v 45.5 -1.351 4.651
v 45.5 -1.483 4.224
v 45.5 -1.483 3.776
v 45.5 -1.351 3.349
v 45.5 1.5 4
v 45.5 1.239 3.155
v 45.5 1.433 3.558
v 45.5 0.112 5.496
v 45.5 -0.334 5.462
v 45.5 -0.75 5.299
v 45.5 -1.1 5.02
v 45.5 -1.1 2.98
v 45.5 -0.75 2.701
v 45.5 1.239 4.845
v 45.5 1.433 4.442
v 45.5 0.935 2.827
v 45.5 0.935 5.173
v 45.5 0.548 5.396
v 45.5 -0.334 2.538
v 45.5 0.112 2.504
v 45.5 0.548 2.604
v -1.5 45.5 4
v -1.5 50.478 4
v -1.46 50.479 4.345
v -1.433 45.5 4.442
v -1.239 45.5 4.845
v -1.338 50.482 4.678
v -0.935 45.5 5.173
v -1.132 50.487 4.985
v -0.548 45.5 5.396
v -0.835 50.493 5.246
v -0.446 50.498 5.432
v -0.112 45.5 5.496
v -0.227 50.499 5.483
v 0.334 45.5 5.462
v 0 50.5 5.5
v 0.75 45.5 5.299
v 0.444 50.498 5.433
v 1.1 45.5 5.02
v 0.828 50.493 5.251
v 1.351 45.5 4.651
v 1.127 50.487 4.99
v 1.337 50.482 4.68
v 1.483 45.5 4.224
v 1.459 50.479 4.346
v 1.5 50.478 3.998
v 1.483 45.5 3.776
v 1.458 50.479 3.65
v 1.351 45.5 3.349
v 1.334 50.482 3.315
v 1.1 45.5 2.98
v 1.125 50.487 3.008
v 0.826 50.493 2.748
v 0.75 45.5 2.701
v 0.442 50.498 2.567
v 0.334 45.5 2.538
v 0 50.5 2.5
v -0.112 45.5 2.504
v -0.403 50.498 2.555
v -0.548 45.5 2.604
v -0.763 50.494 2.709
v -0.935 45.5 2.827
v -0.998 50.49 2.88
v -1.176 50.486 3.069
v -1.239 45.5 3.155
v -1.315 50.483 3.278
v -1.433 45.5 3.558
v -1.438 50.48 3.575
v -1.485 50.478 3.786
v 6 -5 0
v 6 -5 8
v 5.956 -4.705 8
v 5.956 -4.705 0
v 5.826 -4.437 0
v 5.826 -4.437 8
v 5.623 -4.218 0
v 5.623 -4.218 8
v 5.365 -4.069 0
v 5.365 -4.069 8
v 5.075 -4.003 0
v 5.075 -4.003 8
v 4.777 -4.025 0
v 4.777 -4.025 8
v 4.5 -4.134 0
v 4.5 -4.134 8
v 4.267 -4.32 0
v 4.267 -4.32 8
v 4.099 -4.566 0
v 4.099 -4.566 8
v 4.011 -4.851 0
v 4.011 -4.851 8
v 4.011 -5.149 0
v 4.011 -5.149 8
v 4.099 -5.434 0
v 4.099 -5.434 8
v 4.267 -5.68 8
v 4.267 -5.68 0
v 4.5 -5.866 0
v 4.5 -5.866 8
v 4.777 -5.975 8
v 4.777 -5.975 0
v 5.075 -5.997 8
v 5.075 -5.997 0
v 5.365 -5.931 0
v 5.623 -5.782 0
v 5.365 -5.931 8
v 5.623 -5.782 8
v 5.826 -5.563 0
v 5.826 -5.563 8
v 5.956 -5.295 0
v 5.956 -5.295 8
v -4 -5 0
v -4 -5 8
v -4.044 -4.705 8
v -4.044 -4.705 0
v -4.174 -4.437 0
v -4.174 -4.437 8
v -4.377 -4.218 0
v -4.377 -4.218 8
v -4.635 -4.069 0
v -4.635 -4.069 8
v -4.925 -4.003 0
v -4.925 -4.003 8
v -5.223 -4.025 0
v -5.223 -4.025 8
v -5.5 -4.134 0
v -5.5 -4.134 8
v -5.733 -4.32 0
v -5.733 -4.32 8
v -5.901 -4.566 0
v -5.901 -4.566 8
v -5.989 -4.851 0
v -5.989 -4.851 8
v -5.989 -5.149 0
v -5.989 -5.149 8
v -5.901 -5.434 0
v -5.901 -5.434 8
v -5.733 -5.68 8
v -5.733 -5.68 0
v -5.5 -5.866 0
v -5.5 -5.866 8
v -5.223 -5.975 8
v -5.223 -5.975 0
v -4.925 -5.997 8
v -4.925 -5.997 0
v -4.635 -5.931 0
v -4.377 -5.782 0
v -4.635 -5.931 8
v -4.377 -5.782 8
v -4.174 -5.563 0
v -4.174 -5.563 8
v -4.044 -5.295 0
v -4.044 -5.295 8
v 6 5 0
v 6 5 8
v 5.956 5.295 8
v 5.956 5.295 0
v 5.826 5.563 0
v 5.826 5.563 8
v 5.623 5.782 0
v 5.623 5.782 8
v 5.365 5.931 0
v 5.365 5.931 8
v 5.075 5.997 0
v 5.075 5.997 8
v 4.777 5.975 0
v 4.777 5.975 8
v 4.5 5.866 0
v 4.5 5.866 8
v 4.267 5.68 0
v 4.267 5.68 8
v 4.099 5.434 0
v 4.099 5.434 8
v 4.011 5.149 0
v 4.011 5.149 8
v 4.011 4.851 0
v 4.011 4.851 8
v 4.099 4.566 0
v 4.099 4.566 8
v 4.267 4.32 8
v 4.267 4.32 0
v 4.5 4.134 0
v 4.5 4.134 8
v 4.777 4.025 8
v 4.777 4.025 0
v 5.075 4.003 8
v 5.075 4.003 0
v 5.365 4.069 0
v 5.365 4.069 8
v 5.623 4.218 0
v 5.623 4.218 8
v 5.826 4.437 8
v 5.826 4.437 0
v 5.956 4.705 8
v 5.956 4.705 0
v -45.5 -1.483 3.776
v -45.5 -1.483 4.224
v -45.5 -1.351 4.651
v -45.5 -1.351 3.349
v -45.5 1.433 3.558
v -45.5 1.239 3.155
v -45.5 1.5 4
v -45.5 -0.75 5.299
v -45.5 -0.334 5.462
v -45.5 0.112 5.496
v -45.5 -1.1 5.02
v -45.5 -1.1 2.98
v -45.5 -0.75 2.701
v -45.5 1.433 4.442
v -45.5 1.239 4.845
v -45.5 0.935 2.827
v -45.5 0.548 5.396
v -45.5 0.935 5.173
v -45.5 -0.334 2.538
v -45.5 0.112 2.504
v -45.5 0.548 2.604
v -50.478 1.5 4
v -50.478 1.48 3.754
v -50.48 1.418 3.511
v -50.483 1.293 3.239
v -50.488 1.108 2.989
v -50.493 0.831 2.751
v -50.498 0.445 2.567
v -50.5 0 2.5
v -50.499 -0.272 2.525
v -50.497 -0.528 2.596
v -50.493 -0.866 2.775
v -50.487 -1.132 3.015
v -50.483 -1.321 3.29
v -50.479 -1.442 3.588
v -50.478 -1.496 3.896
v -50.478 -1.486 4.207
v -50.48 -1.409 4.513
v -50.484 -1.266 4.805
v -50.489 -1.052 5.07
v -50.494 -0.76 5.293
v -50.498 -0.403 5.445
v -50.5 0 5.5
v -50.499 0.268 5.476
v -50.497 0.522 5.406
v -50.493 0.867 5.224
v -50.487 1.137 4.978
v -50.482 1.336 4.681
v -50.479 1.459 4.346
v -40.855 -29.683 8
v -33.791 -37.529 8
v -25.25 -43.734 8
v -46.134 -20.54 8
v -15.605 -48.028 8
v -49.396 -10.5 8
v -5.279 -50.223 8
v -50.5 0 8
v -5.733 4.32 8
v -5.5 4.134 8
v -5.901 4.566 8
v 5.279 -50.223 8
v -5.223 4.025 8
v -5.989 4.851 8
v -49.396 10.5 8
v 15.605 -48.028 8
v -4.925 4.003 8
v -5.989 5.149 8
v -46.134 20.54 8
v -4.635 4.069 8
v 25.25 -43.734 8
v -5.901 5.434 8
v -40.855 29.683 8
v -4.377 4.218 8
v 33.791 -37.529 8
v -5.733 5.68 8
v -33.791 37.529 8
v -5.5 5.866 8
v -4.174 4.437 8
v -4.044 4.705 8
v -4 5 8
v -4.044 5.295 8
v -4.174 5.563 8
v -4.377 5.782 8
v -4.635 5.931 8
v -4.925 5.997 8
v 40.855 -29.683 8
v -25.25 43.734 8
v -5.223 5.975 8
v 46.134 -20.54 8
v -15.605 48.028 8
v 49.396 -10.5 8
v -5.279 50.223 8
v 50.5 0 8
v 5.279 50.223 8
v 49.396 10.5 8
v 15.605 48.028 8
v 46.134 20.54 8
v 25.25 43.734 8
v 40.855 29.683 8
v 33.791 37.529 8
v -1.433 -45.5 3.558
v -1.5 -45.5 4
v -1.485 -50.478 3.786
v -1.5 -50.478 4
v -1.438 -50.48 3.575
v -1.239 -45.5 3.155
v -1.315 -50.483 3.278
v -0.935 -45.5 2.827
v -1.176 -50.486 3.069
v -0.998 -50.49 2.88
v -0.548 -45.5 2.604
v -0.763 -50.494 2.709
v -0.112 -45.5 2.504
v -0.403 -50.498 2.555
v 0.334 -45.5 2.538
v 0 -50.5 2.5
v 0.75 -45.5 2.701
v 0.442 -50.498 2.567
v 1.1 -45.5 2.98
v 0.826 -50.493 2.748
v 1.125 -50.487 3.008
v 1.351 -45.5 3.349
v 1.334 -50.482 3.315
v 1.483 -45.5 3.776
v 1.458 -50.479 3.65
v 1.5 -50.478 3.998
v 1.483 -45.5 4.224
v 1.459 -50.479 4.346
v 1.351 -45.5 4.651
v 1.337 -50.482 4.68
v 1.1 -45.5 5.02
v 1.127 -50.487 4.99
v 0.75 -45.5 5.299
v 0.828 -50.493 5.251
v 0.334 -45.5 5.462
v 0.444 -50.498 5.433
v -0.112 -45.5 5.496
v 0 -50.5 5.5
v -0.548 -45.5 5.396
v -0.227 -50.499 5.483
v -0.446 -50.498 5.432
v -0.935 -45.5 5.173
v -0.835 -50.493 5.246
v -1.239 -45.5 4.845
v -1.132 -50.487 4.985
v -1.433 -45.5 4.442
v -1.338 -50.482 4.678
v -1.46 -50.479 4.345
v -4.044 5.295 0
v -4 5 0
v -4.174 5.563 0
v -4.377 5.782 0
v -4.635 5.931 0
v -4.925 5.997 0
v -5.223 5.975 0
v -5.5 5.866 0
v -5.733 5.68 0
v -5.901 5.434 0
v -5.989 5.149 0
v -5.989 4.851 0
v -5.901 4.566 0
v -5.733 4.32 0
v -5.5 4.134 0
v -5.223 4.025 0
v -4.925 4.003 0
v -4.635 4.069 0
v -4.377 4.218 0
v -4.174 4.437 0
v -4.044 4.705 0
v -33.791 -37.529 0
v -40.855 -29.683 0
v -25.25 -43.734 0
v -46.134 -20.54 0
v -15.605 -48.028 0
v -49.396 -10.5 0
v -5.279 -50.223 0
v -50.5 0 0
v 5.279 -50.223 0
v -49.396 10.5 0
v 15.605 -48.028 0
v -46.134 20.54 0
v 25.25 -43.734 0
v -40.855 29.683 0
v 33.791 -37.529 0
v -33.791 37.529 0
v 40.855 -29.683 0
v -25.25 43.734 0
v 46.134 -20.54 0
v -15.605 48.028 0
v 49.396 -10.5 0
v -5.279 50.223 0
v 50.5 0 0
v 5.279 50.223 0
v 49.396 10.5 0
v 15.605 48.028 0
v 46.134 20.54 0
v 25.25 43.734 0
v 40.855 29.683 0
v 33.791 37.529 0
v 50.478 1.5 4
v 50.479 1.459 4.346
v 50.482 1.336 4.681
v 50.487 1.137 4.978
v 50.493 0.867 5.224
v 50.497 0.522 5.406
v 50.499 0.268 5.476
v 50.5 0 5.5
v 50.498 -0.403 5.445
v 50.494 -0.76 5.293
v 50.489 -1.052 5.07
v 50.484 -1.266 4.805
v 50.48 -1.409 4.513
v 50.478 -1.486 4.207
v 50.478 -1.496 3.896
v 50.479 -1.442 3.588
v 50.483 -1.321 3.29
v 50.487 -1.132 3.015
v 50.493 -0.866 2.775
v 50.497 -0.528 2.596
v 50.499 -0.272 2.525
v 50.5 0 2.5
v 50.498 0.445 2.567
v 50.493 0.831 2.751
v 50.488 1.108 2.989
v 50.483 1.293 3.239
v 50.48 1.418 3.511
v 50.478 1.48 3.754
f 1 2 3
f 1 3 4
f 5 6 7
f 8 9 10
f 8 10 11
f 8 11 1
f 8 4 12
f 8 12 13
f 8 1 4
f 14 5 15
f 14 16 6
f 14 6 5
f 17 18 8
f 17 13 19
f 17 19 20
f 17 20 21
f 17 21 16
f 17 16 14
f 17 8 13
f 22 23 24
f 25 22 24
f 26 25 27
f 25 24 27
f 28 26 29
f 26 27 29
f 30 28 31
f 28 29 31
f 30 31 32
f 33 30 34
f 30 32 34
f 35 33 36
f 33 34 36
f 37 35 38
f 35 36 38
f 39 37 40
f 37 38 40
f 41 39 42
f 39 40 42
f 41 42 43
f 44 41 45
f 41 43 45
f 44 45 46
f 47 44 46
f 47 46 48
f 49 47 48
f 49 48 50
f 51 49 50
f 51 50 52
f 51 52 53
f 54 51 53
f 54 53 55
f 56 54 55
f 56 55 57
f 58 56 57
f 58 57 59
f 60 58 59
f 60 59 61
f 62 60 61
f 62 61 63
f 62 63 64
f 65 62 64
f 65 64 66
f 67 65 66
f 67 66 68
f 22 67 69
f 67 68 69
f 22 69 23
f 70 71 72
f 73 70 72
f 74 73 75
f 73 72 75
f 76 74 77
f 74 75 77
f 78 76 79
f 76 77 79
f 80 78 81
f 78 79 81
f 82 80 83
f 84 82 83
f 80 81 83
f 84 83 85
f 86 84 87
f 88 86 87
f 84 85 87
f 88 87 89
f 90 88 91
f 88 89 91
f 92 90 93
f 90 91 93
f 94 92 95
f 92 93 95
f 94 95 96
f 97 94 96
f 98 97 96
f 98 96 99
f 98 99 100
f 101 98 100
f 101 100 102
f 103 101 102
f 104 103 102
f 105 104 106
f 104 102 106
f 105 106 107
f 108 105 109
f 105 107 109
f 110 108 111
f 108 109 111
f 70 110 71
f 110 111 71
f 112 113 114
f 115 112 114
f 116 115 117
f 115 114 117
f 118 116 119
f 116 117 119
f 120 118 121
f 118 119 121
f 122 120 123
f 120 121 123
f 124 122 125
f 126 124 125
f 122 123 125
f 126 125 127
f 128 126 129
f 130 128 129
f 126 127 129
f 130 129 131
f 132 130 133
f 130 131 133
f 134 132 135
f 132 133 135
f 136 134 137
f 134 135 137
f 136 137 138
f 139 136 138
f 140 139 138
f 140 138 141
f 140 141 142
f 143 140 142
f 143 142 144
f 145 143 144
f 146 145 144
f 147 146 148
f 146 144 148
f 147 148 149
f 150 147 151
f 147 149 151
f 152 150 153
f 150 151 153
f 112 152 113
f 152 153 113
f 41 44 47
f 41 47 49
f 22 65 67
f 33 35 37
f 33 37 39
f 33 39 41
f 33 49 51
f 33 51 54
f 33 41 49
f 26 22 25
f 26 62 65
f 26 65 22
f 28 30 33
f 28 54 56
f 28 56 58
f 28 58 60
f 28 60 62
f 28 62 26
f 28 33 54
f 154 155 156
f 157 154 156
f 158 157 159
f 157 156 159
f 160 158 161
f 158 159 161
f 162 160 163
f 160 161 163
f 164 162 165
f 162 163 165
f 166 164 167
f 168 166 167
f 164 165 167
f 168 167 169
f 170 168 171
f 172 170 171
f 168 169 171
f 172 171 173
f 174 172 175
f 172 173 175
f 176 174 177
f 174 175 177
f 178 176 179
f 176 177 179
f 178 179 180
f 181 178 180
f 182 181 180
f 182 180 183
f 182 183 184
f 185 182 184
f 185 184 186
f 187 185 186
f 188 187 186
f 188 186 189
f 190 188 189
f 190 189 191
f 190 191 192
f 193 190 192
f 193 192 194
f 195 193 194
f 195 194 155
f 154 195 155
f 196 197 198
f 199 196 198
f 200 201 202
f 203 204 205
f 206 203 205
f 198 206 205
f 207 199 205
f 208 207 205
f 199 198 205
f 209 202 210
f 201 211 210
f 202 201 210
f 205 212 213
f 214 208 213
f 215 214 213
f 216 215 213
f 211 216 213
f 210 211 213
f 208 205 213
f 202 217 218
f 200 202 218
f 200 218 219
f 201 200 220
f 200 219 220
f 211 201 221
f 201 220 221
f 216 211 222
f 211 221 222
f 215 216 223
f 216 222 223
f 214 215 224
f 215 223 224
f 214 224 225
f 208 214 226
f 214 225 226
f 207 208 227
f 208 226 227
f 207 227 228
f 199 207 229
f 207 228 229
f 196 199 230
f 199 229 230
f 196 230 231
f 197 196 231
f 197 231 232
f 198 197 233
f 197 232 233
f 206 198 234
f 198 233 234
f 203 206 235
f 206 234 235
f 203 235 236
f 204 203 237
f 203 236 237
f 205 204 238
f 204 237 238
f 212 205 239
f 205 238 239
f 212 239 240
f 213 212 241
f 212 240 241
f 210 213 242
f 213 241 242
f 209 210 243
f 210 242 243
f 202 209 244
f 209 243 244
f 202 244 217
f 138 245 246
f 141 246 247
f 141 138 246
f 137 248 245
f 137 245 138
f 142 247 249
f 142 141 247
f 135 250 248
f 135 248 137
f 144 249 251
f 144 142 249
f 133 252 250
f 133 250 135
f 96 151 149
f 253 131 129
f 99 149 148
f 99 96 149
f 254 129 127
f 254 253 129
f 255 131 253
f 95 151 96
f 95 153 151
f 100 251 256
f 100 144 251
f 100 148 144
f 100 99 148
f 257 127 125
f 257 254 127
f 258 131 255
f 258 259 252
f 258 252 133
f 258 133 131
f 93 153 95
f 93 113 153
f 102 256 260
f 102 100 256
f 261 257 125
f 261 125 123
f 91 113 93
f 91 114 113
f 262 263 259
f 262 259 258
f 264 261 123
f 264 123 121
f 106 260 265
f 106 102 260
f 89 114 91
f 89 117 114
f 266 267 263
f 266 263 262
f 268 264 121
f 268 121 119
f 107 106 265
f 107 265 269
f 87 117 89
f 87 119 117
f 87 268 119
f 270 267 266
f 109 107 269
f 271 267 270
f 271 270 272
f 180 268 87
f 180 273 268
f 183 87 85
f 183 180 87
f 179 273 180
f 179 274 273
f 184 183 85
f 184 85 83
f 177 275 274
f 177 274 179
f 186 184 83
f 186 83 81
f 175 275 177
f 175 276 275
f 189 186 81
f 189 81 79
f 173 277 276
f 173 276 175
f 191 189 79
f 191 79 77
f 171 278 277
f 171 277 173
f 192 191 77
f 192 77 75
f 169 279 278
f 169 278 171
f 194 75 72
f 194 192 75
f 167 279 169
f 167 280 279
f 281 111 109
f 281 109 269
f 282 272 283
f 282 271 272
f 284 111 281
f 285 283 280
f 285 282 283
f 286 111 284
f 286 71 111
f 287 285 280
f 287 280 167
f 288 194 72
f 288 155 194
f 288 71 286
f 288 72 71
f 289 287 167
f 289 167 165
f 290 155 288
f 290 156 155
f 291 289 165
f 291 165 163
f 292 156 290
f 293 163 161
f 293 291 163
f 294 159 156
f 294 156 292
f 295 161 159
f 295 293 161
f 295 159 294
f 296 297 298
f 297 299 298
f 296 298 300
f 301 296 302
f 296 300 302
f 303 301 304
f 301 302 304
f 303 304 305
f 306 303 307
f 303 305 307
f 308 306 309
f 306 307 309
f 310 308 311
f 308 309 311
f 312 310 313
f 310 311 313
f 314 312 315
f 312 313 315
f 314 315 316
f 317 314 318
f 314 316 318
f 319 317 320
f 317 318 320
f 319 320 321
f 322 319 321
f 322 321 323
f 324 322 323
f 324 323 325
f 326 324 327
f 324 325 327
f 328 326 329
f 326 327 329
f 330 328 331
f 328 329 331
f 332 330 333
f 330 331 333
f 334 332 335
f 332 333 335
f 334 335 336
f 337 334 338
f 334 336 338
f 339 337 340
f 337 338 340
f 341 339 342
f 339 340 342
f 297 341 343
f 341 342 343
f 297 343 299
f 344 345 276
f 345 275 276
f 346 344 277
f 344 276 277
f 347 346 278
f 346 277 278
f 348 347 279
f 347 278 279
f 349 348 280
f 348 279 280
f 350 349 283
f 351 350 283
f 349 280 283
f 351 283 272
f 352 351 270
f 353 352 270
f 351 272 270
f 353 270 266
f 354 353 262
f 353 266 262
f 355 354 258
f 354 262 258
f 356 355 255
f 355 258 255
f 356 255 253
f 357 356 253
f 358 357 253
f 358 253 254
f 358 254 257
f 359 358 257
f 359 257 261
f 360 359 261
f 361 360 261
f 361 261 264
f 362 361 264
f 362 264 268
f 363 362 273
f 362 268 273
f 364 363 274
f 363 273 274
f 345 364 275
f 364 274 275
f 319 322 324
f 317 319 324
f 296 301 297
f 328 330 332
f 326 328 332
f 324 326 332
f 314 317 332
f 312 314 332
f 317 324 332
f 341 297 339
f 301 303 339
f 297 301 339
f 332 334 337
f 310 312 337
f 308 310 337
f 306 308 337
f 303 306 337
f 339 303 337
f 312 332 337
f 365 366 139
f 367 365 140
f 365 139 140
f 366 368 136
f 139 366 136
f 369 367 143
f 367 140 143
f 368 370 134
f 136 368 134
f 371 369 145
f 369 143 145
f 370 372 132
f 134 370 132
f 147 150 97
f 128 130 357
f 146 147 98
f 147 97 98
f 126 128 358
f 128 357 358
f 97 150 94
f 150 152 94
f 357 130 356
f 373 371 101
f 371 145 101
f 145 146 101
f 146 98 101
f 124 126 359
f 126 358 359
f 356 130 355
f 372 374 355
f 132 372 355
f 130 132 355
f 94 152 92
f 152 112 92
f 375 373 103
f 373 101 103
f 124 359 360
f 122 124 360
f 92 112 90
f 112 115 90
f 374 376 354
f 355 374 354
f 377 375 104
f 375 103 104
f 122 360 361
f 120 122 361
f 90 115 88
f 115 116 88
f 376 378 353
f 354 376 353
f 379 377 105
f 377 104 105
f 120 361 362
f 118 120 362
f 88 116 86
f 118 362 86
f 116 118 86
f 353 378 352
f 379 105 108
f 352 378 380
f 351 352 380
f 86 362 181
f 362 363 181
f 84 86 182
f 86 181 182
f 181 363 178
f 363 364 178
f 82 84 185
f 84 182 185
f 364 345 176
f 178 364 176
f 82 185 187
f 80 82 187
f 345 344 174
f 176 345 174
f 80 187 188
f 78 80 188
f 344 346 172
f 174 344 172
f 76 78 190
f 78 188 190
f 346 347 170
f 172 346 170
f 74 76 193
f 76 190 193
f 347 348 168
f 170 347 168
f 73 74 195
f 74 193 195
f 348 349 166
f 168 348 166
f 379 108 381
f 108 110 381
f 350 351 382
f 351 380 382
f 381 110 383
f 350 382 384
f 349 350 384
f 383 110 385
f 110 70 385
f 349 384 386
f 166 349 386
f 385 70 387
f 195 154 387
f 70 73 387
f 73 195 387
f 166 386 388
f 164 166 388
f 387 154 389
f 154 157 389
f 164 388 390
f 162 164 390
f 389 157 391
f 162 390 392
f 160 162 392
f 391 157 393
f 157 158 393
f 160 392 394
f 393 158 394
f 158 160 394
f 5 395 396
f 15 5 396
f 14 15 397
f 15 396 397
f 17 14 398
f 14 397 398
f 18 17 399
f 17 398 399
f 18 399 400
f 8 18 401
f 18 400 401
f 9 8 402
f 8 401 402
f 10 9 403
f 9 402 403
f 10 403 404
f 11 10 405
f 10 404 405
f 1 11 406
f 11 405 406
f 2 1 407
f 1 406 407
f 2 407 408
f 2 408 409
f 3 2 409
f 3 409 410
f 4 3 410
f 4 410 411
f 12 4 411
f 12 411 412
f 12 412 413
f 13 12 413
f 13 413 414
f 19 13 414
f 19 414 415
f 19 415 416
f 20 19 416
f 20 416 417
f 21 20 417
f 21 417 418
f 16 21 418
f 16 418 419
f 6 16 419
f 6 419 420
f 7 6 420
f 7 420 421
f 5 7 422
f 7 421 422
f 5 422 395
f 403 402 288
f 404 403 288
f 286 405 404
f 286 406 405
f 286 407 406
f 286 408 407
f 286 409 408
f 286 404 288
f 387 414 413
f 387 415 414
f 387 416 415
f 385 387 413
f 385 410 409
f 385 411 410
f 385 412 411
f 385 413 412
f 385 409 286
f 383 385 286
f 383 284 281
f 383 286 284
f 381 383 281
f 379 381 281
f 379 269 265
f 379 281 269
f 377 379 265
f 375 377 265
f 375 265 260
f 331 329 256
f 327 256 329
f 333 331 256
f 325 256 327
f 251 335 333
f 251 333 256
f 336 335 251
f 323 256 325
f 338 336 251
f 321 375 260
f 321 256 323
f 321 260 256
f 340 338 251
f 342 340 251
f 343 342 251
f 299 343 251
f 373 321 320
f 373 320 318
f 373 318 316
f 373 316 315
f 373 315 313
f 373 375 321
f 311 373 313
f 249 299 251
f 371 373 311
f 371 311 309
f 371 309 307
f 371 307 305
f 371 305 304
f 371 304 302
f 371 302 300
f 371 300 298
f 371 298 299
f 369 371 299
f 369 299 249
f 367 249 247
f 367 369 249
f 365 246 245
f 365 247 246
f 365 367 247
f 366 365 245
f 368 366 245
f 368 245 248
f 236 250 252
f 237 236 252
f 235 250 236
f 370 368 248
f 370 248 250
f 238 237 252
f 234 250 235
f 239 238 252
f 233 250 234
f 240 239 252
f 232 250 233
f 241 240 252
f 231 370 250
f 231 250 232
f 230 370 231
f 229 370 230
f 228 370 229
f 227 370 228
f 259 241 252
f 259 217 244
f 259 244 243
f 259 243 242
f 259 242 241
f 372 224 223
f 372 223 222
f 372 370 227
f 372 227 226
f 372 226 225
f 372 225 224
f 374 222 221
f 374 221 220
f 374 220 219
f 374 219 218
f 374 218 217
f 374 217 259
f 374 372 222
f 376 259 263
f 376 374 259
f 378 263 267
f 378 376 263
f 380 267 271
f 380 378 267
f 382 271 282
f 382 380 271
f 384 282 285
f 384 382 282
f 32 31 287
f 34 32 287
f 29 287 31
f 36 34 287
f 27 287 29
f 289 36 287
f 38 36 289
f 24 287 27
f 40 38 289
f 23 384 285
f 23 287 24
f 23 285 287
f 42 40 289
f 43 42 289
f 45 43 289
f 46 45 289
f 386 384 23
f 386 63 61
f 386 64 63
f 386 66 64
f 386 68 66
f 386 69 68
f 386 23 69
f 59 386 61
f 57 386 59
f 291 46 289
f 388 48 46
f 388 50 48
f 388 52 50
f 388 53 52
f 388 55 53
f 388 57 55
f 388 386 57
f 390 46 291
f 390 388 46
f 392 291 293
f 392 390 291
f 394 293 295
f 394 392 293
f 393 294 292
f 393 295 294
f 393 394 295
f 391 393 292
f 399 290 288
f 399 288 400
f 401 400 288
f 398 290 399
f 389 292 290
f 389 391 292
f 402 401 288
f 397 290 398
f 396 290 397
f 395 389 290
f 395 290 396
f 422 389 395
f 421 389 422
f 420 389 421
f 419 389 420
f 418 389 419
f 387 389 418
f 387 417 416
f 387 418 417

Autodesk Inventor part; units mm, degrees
sketch "スケッチ1" plane through (0, 0, 0) normal (0, 0, 1) x (1, 0, 0)
  circle A0 centre (0, 0) radius 50.5
  dimension "d0" = 101
extrude "押し出し1" add sketch "スケッチ1" along normal blind 8
sketch "スケッチ2" plane through (0, 0, 8) normal (0, 0, 1) x (1, 0, 0)
  line L0 (-5, -5) -> (5, -5) construction
  line L1 (5, -5) -> (5, 5) construction
  line L2 (5, 5) -> (-5, 5) construction
  line L3 (-5, 5) -> (-5, -5) construction
  line L4 (-5, -5) -> (5, 5) construction
  line L5 (5, -5) -> (-5, 5) construction
  circle A0 centre (-5, 5) radius 1
  circle A1 centre (5, 5) radius 1
  circle A2 centre (5, -5) radius 1
  circle A3 centre (-5, -5) radius 1
  point P0 (0, 0)
  dimension "d3" = 10
  dimension "d4" = 10
  dimension "d5" = 2
  dimension "d6" = 2
  dimension "d7" = 2
  dimension "d8" = 2
extrude "押し出し2" cut sketch "スケッチ2" against normal blind 8
ref_plane "作業平面1" through (50.5, 0, 0) normal (1, 0, 0) x (0, 1, 0)
ref_plane "作業平面2" through (-50.5, 0, 0) normal (1, 0, 0) x (0, 1, 0)
ref_plane "作業平面3" through (0, 50.5, 0) normal (0, 1, 0) x (-1, 0, 0)
ref_plane "作業平面4" through (0, -50.5, 0) normal (0, 1, 0) x (-1, 0, 0)
sketch "スケッチ3" plane through (50.5, 0, 0) normal (1, 0, 0) x (0, 1, 0)
  line L0 (0, 0) -> (0, 4) construction
  circle A0 centre (0, 4) radius 1.5
  dimension "d14" = 4
  dimension "d15" = 3
extrude "押し出し3" cut sketch "スケッチ3" against normal blind 5
sketch "スケッチ4" plane through (-50.5, 0, 0) normal (1, 0, 0) x (0, 1, 0)
  line L0 (0, 0) -> (0, 4) construction
  circle A0 centre (0, 4) radius 1.5
  dimension "d18" = 4
  dimension "d19" = 3
extrude "押し出し4" cut sketch "スケッチ4" along normal blind 5
sketch "スケッチ5" plane through (0, 50.5, 0) normal (0, 1, 0) x (-1, 0, 0)
  line L0 (0, 0) -> (0, 4) construction
  circle A0 centre (0, 4) radius 1.5
  dimension "d22" = 4
  dimension "d23" = 3
extrude "押し出し5" cut sketch "スケッチ5" against normal blind 5
sketch "スケッチ6" plane through (0, -50.5, 0) normal (0, 1, 0) x (-1, 0, 0)
  line L0 (0, 0) -> (0, 4) construction
  circle A0 centre (0, 4) radius 1.5
  dimension "d26" = 4
  dimension "d27" = 3
extrude "押し出し6" cut sketch "スケッチ6" along normal blind 5
thread "ねじ1" size "M3x0.5" class "6H" standard "ANSI Metric M Profile" full length
thread "ねじ2" size "M3x0.5" class "6H" standard "ANSI Metric M Profile" full length
thread "ねじ3" size "M3x0.5" class "6H" standard "ANSI Metric M Profile" full length
thread "ねじ4" size "M3x0.5" class "6H" standard "ANSI Metric M Profile" full length
thread "ねじ5" size "M2x0.4" class "6H" standard "ANSI Metric M Profile" full length
thread "ねじ6" size "M2x0.4" class "6H" standard "ANSI Metric M Profile" full length
thread "ねじ7" size "M2x0.4" class "6H" standard "ANSI Metric M Profile" full length
thread "ねじ8" size "M2x0.4" class "6H" standard "ANSI Metric M Profile" full length
properties part number "outsideBottom2"
